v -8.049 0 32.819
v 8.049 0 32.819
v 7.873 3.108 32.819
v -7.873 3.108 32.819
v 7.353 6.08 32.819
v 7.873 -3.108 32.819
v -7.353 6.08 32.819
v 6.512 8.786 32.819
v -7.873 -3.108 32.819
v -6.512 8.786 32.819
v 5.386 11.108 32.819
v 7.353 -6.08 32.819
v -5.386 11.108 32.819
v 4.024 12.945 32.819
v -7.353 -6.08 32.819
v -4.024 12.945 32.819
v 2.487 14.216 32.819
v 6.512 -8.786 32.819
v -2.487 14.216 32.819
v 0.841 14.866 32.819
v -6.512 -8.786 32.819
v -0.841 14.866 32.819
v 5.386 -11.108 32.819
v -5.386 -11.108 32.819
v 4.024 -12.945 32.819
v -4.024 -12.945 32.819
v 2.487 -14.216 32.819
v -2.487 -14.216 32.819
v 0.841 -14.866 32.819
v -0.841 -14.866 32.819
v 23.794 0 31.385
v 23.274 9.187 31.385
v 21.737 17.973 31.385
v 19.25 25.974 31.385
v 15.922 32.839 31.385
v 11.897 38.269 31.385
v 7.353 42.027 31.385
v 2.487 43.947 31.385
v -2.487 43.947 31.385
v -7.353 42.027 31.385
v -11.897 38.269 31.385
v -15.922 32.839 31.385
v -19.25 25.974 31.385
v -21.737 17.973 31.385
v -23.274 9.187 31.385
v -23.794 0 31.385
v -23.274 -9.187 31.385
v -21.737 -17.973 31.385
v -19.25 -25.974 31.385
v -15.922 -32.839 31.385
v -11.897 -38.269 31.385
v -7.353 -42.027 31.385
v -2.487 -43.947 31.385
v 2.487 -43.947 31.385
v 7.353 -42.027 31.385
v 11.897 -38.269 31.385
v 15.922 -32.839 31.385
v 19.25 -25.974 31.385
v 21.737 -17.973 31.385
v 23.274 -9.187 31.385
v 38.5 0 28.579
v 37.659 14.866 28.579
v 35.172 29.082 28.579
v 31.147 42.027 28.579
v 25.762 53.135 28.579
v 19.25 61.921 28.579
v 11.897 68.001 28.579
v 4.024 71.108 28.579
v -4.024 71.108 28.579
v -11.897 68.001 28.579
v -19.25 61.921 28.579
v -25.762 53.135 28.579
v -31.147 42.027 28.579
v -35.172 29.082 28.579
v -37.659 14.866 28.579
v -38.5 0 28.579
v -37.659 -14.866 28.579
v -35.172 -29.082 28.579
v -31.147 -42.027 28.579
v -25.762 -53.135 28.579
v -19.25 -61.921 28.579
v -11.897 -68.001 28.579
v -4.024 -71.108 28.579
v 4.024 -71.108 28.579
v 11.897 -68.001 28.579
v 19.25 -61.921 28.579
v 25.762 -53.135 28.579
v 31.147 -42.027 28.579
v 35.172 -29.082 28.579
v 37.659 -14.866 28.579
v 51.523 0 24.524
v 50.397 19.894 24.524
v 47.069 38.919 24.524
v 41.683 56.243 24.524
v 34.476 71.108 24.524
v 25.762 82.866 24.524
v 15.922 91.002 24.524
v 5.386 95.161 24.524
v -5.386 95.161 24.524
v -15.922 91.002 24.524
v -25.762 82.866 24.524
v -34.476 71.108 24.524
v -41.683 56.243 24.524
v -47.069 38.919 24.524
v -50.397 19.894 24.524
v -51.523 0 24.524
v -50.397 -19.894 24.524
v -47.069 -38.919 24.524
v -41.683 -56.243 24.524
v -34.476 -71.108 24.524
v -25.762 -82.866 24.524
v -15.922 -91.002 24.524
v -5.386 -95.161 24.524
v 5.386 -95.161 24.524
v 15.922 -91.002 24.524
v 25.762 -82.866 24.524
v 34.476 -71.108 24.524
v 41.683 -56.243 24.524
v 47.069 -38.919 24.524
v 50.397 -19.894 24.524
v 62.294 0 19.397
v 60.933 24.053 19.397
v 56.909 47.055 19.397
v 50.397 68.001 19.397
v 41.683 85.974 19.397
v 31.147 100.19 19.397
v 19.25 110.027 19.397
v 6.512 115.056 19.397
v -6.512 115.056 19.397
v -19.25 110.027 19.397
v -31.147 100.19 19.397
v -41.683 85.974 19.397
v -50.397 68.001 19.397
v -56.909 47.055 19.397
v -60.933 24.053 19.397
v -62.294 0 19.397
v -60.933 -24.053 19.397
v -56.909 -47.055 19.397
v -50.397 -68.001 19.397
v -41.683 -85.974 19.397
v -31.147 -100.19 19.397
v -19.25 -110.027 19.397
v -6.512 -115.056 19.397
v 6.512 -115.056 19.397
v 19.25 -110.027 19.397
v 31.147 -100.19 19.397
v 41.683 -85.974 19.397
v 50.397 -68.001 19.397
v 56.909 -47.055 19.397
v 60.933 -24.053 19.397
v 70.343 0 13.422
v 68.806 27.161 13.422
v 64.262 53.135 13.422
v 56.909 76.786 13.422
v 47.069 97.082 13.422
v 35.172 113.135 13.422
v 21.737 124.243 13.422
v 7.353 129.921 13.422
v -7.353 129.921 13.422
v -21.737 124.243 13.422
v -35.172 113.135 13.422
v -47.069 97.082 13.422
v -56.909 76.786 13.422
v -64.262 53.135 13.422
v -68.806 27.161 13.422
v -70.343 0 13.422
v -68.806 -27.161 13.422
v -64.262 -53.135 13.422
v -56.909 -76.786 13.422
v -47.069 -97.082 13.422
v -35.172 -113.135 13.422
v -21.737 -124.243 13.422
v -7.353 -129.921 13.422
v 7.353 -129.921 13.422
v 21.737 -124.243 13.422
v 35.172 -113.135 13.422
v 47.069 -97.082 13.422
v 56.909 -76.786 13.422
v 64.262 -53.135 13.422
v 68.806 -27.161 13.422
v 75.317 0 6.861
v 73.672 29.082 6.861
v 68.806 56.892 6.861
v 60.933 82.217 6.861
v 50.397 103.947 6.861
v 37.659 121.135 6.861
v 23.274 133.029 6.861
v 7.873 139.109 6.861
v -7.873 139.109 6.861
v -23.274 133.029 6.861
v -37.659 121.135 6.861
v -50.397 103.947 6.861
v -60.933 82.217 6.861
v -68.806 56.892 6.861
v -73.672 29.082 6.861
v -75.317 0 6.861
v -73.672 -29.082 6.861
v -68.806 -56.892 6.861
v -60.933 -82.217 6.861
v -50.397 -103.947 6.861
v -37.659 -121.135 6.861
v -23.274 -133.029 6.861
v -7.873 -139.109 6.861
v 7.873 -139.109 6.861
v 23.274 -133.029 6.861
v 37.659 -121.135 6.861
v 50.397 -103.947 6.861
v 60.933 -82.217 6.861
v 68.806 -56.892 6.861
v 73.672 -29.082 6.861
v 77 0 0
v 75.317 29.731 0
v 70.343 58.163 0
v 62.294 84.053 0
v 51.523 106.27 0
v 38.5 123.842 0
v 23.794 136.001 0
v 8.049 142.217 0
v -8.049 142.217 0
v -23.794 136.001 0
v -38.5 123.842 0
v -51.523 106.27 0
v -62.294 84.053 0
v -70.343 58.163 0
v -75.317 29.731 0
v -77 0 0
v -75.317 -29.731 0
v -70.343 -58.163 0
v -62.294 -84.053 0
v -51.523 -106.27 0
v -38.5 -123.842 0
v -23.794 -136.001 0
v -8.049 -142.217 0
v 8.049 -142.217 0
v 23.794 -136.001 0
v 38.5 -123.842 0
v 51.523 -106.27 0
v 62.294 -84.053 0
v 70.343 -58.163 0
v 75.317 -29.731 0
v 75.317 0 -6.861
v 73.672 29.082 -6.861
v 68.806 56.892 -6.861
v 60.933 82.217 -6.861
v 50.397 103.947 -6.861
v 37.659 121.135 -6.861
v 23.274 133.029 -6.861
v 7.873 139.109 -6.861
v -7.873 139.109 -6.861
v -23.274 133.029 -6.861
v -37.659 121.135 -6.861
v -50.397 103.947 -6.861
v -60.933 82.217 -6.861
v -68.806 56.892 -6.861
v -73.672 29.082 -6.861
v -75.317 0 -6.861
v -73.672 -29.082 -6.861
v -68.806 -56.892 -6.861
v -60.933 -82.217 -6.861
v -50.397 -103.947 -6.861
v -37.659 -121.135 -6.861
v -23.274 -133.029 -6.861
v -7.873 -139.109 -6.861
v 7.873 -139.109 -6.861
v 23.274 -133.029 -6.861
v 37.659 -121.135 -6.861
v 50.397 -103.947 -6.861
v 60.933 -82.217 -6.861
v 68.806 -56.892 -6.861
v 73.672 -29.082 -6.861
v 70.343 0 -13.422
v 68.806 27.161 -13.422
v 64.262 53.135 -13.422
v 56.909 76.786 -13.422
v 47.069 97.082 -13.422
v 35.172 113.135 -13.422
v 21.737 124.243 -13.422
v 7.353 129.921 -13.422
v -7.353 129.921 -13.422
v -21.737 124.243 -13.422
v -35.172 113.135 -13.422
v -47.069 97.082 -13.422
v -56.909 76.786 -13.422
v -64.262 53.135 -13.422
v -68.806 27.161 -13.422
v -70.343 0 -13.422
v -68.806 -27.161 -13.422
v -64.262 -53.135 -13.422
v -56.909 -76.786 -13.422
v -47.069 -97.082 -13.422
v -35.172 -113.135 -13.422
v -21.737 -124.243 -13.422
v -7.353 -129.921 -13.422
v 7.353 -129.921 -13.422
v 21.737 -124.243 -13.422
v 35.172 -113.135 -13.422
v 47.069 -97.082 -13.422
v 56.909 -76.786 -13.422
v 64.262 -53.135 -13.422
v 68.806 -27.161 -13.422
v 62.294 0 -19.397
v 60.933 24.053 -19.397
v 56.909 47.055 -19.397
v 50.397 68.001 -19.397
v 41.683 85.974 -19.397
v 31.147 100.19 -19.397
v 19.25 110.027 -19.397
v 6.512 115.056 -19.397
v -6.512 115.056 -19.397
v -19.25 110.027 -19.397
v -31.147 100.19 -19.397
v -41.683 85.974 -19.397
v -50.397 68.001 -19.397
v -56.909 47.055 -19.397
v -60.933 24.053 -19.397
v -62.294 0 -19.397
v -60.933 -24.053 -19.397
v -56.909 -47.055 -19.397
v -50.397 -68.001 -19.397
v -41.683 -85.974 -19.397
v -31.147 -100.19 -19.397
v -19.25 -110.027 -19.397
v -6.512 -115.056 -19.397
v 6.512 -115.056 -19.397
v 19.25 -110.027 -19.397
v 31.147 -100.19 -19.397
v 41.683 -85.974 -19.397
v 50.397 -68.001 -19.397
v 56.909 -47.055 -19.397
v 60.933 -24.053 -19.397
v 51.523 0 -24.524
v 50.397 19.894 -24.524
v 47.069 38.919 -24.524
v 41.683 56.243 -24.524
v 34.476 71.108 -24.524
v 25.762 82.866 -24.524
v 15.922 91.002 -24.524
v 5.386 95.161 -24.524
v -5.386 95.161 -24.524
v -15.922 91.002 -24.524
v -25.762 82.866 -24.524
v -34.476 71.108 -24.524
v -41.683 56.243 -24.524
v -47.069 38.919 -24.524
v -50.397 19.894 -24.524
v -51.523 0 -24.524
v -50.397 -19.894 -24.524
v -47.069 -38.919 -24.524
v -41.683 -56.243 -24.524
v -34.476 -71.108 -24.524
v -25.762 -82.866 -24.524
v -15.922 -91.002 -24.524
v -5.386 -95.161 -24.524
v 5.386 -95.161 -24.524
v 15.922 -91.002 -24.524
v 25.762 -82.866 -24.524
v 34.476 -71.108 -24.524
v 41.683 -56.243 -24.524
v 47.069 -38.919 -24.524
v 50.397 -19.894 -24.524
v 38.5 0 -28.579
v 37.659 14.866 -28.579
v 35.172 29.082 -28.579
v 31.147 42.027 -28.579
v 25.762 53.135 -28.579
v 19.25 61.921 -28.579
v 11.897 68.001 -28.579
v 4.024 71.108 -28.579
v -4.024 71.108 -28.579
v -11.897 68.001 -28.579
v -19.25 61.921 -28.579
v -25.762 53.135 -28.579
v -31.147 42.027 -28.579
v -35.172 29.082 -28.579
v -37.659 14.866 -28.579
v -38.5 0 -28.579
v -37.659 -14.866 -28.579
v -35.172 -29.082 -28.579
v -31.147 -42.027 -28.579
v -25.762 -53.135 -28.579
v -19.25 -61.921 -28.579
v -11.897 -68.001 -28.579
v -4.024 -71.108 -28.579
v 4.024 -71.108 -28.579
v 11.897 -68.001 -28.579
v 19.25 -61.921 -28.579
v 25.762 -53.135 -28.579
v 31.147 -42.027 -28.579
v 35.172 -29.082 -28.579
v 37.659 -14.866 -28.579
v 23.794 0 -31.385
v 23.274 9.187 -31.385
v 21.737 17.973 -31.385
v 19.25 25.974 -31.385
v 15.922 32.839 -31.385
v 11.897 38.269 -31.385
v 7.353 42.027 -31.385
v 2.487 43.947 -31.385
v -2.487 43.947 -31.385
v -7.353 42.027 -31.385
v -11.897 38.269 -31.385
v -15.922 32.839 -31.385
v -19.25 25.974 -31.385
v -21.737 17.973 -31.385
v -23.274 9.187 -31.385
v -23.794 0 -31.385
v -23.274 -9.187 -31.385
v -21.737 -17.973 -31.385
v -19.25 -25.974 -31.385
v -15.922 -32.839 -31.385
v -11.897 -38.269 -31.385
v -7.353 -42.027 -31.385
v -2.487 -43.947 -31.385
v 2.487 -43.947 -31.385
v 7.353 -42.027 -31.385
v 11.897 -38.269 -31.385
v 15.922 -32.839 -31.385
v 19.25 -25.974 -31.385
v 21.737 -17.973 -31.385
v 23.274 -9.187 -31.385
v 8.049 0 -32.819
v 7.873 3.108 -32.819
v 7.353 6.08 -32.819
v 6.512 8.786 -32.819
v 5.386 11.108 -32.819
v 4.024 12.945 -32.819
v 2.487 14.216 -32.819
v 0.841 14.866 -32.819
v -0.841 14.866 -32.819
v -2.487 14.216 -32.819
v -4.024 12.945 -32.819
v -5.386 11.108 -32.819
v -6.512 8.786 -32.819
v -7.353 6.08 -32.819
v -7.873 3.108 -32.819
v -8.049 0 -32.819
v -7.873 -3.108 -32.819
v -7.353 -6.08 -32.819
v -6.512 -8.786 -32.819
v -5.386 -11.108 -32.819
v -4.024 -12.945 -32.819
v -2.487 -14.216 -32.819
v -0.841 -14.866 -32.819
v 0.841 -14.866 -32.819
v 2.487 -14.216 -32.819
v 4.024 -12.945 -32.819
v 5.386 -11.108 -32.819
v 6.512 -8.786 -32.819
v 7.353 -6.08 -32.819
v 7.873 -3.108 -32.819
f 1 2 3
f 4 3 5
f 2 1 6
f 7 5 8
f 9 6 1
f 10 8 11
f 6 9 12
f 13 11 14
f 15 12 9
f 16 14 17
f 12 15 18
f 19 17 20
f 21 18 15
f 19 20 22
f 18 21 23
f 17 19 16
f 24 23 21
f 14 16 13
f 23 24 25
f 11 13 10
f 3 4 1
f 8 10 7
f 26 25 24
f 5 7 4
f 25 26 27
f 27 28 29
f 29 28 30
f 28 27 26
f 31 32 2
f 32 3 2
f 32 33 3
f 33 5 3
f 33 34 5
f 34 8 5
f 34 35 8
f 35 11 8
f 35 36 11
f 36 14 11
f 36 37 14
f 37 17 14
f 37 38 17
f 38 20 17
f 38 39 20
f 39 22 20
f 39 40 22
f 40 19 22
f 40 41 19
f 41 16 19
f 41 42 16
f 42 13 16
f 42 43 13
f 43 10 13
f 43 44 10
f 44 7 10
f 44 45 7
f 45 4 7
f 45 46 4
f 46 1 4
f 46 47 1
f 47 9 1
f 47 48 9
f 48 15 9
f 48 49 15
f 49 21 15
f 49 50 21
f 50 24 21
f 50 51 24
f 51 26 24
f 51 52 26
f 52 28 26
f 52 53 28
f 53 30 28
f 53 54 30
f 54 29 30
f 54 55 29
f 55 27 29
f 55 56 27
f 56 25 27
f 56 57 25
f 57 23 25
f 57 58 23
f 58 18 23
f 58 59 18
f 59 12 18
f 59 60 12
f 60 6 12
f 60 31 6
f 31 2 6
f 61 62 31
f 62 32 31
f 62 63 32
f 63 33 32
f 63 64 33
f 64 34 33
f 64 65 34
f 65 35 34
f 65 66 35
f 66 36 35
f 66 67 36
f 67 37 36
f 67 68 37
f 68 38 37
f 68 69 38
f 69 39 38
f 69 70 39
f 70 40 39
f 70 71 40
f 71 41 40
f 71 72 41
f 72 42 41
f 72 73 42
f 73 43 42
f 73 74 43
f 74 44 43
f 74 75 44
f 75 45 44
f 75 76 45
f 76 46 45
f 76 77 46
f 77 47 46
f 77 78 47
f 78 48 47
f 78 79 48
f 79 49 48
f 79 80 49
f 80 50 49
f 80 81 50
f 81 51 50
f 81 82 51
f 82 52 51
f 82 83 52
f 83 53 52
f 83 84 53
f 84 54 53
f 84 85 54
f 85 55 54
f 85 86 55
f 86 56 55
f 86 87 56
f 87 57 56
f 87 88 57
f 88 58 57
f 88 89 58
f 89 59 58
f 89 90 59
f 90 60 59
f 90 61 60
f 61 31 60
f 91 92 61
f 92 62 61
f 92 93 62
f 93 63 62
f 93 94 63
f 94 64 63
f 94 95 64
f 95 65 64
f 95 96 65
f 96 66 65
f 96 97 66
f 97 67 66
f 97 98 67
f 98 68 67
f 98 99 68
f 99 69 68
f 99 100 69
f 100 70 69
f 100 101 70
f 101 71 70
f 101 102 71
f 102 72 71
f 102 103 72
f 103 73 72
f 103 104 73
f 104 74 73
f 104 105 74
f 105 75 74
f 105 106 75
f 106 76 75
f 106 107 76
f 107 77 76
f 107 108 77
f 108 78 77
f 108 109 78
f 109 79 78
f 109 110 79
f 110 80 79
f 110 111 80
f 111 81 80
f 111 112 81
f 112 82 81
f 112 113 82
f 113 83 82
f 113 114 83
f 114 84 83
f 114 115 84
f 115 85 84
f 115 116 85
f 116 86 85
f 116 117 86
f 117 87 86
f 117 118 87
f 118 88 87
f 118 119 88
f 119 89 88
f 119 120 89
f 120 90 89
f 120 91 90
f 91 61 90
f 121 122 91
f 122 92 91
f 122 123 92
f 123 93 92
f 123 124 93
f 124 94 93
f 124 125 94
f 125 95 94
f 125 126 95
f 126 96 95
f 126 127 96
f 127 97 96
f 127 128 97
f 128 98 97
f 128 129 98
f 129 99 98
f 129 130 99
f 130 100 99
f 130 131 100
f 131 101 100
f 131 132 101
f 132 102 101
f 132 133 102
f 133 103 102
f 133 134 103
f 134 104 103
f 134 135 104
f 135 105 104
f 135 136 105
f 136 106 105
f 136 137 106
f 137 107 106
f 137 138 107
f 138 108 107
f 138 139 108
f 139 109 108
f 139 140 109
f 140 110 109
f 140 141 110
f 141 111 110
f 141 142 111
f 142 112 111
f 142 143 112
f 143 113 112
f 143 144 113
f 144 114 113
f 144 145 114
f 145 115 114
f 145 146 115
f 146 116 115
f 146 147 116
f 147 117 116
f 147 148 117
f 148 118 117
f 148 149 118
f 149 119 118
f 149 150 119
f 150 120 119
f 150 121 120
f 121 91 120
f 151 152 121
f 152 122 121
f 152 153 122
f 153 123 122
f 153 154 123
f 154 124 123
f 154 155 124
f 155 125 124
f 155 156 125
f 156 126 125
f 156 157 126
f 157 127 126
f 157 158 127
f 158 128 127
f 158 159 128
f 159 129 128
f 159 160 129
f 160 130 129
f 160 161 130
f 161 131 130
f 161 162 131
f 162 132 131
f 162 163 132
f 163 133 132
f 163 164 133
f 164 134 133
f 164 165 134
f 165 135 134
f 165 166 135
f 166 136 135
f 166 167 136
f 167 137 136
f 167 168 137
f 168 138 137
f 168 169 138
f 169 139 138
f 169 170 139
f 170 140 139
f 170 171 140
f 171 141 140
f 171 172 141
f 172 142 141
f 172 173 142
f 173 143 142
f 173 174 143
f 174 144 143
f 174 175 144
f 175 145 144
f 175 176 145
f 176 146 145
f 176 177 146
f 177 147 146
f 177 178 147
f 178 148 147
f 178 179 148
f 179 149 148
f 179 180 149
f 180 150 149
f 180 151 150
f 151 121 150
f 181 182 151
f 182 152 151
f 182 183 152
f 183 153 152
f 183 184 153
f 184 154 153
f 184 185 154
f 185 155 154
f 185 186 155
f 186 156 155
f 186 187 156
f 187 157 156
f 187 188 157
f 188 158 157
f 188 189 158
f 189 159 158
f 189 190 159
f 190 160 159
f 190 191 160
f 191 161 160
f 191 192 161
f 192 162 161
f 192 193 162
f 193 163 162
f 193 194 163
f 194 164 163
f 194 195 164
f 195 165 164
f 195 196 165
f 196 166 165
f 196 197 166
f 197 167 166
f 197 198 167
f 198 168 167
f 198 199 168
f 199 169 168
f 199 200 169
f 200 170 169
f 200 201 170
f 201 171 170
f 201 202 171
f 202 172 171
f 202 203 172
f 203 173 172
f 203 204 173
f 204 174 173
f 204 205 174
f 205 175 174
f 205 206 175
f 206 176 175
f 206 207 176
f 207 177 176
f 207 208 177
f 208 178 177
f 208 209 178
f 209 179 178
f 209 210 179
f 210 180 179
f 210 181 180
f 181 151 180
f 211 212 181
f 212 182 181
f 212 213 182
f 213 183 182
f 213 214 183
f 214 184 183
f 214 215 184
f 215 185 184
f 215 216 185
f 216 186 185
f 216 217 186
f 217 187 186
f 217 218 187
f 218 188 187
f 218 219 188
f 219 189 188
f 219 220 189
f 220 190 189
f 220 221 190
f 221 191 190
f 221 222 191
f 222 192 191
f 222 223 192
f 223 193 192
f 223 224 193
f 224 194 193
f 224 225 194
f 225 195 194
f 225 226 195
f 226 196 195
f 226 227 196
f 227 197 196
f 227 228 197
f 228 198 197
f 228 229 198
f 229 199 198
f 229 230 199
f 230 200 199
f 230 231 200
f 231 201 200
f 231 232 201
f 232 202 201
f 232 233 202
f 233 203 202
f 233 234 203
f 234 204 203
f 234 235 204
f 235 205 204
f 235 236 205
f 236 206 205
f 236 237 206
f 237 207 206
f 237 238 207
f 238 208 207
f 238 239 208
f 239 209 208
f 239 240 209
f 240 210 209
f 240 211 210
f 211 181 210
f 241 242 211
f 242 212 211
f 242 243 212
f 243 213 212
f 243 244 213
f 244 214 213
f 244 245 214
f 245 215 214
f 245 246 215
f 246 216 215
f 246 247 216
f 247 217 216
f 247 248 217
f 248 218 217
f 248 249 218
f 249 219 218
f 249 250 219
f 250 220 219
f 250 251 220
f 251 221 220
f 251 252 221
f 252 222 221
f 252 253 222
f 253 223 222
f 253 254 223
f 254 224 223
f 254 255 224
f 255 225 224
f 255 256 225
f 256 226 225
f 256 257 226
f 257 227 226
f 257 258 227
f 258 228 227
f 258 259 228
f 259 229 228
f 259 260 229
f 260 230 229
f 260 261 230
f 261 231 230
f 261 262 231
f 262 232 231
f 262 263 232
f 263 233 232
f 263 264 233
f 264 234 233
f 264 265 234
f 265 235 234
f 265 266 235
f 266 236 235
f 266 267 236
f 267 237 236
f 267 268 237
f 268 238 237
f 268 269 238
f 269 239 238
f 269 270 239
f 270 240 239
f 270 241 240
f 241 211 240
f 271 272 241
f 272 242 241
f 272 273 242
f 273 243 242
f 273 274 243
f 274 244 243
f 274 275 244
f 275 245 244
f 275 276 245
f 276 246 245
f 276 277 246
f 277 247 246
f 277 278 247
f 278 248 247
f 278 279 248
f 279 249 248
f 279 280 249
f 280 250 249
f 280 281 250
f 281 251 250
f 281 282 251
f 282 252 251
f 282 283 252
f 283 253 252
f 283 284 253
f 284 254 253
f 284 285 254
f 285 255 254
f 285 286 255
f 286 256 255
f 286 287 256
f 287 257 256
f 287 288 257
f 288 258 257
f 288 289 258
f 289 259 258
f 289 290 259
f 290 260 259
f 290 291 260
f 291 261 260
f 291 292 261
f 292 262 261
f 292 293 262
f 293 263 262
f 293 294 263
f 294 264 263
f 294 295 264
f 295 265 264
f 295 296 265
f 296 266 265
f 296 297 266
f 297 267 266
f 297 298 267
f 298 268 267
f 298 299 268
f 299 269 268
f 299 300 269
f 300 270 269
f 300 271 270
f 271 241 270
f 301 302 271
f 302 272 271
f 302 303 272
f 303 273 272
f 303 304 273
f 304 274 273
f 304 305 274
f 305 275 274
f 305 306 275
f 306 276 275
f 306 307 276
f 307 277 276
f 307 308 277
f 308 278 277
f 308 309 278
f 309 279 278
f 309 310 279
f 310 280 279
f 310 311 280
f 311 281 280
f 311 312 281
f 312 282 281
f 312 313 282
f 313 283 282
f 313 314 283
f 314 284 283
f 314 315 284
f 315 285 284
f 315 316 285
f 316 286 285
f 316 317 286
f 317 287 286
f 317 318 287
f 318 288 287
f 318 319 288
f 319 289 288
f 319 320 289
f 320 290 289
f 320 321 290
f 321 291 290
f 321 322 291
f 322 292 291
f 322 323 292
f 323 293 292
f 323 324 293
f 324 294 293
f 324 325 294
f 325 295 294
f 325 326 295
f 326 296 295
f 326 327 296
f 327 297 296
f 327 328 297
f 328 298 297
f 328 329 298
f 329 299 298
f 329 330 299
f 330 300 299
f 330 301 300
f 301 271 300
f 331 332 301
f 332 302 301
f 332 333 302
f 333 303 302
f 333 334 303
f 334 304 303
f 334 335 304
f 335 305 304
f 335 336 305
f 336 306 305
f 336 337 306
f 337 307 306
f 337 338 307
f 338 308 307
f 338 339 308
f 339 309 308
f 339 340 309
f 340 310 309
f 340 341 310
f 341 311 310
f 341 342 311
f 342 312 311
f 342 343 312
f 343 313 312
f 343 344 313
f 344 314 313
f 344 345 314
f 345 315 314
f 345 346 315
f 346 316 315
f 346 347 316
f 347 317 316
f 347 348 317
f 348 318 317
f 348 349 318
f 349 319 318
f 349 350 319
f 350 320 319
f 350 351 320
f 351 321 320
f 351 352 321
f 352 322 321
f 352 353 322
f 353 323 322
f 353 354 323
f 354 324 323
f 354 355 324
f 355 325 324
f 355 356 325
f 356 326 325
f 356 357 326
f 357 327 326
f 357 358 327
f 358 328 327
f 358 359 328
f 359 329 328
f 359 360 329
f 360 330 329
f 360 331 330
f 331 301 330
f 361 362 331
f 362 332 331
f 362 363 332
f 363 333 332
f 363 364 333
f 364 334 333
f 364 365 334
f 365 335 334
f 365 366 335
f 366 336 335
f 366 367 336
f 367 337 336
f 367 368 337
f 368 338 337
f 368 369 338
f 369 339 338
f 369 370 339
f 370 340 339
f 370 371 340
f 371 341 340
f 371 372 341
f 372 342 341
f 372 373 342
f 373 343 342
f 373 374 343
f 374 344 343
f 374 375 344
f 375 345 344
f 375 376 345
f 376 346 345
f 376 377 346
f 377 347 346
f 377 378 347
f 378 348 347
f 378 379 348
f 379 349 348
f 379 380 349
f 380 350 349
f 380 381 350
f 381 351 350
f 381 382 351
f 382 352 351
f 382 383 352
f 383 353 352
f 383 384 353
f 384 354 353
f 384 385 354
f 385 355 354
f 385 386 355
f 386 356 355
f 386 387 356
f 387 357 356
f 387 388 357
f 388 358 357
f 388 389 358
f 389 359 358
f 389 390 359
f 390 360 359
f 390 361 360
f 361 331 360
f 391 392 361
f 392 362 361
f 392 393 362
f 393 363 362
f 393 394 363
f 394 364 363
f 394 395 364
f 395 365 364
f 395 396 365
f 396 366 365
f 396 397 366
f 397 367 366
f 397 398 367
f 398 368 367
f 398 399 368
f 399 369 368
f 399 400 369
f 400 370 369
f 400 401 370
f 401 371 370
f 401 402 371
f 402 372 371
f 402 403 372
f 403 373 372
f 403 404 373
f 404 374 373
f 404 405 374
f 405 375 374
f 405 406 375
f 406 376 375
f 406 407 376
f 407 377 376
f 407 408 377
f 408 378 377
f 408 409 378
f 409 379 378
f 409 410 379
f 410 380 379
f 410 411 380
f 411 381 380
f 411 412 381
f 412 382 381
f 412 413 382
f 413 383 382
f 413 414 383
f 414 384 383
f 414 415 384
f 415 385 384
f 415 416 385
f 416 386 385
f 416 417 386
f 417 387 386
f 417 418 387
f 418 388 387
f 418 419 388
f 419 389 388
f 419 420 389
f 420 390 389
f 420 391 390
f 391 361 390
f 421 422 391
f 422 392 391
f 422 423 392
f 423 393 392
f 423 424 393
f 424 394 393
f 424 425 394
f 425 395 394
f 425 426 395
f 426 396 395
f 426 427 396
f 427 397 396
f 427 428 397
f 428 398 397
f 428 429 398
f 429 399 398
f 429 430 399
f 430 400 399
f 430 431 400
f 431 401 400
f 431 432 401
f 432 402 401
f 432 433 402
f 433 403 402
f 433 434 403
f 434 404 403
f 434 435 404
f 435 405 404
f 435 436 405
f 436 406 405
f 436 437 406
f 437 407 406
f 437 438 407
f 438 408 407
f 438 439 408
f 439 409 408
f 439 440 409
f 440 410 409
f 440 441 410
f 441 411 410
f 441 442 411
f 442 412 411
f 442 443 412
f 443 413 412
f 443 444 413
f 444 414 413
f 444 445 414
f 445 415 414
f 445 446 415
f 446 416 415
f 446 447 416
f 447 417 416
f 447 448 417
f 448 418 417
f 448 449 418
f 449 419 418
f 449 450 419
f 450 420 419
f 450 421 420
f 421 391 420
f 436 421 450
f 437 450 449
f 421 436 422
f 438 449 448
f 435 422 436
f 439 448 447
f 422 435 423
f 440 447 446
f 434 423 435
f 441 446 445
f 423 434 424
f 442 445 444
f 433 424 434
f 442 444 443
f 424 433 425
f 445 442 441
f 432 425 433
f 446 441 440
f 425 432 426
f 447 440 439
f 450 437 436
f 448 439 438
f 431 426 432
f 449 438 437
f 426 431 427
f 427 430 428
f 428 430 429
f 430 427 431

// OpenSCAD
// Generated by SolidPython 1.0.1 on 2020-07-29 00:46:47


scale(v = [7, 13, 3]) {
	sphere(r = 11);
}
/***********************************************
*********      SolidPython code:      **********
************************************************
 
# import packages: SolidPython
from solid import *
from solid.utils import *
from itertools import chain, combinations, permutations


class Resize:

    def __init__(self, scad_file):
        self.scad_file = scad_file
        #self.scad_file = import_scad(scad_file)
        # cone/cylinder param:
        self.r1 = 0
        self.r2 = 0
        self.h = 0
        # rectangular prism param:
        self.w = 0
        self.l = 0
        # ellipse param:
        self.r = 0

    # import OpenScad code (file name corresponds to shape)


    # classify shape + parameters
    def assign(self, param1, param2, param3):
        if self.scad_file == 'cone.scad':
            self.r1 = param1
            self.r2 = param2
            self.h = param3
        elif self.scad_file == 'cylinder.scad':
            self.r1 = param1
            self.r2 = param2
            self.h = param3
        elif self.scad_file == 'rectangularPrism.scad':
            self.h = param1
            self.l = param2
            self.w = param3
        else:
            self.r = param1
            self.h = param2

    # resize parameters
    def iterate(self):
        x = range(3, 20, 2)
        i = 1
        if self.scad_file == 'cone.scad':
            tempList = list(permutations(x, 2))
            for temp in tempList:
                param1 = temp[0]
                param2 = temp[1]
                filepath = 'produced_scad_files/' + 'cone' + str(param1) + '_' + str(param2) + '_' + '.scad'
                scad_render_to_file(cylinder(h=param1, r1=param2, r2=0), filepath)

        elif self.scad_file == 'cylinder.scad':
            tempList = list(permutations(x, 3))
            for temp in tempList:
                param1 = temp[0]
                param2 = temp[1]
                filepath = 'produced_scad_files/' + 'cylinder' + str(param1) + '_' + str(param2) + '_' + '.scad'
                scad_render_to_file(cylinder(h=param1, r1=param2, r2=param2), filepath)

        elif self.scad_file == 'rectangularPrism.scad':
            tempList = list(permutations(x, 3))
            for temp in tempList:
                param1 = temp[0]
                param2 = temp[1]
                param3 = temp[2]
                filepath = 'produced_scad_files/' + 'rectangularPrism' + str(param1) + '_' + str(param2) + '_' + str(
                    param3) + '.scad'
                scad_render_to_file(cube(size=(param1, param2, param3)), filepath)

        elif self.scad_file == 'ellipse.scad':
            tempList = list(permutations(x, 4))
            for temp in tempList:
                param1 = temp[0]
                param2 = temp[1]
                param3 = temp[2]
                param4 = temp[3]
                filepath = 'produced_scad_files/' + 'ellipse' + str(param1) + '_' + str(param2) + '_' + str(param3) + '_' + str(param4) + '.scad'
                scad_render_to_file(scale([param1, param2, param3])(sphere(r=param4)), filepath)

    def render_to_scadfile(self):
        scad_render_to_file(scad, 'example.scad') 
 
************************************************/
